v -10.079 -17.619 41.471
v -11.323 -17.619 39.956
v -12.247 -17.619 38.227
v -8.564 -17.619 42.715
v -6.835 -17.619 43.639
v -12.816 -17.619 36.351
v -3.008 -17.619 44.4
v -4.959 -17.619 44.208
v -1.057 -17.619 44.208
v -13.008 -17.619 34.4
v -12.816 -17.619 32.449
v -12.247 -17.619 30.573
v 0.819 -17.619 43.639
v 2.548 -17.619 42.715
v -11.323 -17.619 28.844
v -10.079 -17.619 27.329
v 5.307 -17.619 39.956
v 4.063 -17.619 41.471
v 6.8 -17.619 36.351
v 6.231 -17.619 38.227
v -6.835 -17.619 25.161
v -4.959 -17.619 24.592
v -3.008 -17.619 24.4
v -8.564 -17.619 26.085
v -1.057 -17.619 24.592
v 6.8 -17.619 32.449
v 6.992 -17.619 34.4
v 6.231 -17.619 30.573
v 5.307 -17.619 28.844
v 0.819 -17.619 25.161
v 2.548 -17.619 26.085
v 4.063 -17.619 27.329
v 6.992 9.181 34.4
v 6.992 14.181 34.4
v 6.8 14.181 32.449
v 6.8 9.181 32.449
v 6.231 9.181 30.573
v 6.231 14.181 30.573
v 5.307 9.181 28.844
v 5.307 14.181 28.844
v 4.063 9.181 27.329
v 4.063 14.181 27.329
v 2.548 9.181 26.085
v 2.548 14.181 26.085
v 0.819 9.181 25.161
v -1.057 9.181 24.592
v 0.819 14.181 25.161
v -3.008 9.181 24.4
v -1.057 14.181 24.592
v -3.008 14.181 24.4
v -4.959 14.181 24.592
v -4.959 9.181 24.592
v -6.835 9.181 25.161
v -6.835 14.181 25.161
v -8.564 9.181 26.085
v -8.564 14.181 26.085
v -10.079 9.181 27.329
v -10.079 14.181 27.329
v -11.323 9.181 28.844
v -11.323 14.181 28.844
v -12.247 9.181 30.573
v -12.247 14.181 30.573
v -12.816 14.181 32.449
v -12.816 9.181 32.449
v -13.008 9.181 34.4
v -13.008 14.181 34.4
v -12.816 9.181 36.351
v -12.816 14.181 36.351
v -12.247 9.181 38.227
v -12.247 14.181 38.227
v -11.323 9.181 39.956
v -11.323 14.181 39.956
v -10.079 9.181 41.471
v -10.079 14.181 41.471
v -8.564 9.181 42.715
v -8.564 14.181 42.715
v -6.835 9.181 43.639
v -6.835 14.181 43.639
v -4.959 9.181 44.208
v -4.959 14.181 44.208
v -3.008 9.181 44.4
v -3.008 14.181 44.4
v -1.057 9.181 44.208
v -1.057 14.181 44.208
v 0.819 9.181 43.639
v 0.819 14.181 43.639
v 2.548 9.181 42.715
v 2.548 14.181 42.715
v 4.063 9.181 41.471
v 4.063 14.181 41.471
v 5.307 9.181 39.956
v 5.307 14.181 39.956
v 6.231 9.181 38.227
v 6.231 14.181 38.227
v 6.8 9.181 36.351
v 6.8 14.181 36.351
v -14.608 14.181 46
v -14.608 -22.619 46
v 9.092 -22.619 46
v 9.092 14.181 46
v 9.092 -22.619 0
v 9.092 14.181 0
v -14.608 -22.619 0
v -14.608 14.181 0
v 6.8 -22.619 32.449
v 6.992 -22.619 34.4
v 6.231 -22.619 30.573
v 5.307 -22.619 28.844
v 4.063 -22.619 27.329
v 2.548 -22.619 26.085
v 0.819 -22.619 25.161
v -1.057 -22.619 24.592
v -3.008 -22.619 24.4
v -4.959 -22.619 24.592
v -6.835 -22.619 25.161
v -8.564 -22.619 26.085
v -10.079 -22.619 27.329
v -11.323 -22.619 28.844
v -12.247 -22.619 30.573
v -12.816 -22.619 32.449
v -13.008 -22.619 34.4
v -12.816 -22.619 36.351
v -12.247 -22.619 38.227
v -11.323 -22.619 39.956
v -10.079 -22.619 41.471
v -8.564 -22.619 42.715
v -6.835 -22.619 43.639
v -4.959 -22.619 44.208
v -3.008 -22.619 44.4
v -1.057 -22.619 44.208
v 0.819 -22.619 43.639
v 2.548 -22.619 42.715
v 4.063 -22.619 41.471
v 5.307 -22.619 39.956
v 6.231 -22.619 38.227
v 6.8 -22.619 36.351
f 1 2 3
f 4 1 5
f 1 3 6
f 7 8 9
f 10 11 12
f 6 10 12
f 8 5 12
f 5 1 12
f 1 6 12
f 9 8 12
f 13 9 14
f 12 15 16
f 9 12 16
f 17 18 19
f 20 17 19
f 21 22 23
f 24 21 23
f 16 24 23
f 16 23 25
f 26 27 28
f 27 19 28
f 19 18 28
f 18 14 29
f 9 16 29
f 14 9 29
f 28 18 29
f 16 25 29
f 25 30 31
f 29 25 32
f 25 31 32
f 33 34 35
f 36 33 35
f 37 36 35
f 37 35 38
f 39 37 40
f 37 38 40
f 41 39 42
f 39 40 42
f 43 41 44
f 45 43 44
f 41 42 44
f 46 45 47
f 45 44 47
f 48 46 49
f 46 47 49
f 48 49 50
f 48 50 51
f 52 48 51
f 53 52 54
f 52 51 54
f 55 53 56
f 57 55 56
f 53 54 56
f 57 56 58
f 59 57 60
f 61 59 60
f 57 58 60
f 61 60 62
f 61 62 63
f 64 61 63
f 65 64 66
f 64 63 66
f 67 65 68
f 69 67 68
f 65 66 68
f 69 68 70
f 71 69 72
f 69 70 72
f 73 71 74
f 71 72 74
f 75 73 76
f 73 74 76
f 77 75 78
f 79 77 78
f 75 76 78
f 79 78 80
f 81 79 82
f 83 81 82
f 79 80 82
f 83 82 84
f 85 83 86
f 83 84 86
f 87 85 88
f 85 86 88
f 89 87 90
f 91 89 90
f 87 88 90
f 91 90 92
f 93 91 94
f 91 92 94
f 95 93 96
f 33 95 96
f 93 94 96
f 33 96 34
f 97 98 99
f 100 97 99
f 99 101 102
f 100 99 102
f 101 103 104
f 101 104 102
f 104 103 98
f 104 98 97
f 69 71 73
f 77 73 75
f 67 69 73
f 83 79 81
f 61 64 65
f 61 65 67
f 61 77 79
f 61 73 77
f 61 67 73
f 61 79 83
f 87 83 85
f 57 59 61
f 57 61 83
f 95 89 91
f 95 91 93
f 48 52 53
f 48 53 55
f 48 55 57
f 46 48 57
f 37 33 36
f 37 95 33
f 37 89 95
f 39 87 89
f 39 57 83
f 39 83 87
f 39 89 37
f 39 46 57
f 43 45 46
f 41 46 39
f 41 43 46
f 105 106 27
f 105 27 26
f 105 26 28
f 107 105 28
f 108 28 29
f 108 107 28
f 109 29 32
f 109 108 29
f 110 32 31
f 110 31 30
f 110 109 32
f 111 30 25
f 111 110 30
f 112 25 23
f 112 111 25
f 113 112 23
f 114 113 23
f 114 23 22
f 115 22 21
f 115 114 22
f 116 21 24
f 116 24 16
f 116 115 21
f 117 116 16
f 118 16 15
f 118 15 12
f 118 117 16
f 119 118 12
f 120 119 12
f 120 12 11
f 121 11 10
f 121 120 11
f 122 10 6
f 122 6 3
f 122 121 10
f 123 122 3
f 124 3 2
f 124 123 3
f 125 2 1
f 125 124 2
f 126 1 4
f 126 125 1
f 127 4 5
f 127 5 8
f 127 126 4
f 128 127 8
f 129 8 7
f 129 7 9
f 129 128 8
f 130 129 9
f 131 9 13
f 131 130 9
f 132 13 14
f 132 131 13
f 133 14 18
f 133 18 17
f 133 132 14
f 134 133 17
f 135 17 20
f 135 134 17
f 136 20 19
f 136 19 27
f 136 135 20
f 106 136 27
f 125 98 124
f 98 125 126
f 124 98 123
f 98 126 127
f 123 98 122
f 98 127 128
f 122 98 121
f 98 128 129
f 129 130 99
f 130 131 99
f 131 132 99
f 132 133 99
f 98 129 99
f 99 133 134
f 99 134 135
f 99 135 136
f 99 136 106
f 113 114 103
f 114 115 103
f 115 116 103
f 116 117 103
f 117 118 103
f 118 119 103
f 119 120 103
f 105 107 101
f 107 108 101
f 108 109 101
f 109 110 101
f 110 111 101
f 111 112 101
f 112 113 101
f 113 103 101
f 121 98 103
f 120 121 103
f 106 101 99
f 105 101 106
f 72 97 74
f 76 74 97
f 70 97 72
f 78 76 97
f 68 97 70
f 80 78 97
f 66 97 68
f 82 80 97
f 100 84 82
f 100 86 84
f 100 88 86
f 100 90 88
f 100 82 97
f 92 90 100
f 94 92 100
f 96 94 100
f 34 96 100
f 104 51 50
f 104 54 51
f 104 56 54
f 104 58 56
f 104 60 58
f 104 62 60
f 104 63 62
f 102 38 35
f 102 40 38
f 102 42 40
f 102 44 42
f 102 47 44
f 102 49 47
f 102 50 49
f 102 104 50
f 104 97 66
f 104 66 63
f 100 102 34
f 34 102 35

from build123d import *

# Parameters (mm, degrees)
SKETCH1_W           = 23.7
SKETCH1_H           = 36.8
BOSS_EXTRUDE2_DEPTH = 46
SKETCH2_R           = 10
CUT_EXTRUDE1_DEPTH  = 5


with BuildPart() as part:
    # Sketch1 → Boss-Extrude2 (new body)
    with BuildSketch(Plane.XY):
        with Locations((-2.757896825, -4.218611111)):
            Rectangle(SKETCH1_W, SKETCH1_H)
    extrude(amount=BOSS_EXTRUDE2_DEPTH)

    # Sketch2 → Cut-Extrude1 (cut)
    with BuildSketch(Plane(origin=(0, 14.181388889, 0), x_dir=(1, 0, 0), z_dir=(0, 1, 0))):
        with Locations((-3.007896825, -34.4)):
            Circle(SKETCH2_R)
    cut_extrude1 = extrude(amount=-CUT_EXTRUDE1_DEPTH, mode=Mode.SUBTRACT)

    # Mirror1: Cut-Extrude1 across plane
    add(cut_extrude1.mirror(Plane.ZX.offset(-4.218611111)), mode=Mode.SUBTRACT)


solid = part.part
